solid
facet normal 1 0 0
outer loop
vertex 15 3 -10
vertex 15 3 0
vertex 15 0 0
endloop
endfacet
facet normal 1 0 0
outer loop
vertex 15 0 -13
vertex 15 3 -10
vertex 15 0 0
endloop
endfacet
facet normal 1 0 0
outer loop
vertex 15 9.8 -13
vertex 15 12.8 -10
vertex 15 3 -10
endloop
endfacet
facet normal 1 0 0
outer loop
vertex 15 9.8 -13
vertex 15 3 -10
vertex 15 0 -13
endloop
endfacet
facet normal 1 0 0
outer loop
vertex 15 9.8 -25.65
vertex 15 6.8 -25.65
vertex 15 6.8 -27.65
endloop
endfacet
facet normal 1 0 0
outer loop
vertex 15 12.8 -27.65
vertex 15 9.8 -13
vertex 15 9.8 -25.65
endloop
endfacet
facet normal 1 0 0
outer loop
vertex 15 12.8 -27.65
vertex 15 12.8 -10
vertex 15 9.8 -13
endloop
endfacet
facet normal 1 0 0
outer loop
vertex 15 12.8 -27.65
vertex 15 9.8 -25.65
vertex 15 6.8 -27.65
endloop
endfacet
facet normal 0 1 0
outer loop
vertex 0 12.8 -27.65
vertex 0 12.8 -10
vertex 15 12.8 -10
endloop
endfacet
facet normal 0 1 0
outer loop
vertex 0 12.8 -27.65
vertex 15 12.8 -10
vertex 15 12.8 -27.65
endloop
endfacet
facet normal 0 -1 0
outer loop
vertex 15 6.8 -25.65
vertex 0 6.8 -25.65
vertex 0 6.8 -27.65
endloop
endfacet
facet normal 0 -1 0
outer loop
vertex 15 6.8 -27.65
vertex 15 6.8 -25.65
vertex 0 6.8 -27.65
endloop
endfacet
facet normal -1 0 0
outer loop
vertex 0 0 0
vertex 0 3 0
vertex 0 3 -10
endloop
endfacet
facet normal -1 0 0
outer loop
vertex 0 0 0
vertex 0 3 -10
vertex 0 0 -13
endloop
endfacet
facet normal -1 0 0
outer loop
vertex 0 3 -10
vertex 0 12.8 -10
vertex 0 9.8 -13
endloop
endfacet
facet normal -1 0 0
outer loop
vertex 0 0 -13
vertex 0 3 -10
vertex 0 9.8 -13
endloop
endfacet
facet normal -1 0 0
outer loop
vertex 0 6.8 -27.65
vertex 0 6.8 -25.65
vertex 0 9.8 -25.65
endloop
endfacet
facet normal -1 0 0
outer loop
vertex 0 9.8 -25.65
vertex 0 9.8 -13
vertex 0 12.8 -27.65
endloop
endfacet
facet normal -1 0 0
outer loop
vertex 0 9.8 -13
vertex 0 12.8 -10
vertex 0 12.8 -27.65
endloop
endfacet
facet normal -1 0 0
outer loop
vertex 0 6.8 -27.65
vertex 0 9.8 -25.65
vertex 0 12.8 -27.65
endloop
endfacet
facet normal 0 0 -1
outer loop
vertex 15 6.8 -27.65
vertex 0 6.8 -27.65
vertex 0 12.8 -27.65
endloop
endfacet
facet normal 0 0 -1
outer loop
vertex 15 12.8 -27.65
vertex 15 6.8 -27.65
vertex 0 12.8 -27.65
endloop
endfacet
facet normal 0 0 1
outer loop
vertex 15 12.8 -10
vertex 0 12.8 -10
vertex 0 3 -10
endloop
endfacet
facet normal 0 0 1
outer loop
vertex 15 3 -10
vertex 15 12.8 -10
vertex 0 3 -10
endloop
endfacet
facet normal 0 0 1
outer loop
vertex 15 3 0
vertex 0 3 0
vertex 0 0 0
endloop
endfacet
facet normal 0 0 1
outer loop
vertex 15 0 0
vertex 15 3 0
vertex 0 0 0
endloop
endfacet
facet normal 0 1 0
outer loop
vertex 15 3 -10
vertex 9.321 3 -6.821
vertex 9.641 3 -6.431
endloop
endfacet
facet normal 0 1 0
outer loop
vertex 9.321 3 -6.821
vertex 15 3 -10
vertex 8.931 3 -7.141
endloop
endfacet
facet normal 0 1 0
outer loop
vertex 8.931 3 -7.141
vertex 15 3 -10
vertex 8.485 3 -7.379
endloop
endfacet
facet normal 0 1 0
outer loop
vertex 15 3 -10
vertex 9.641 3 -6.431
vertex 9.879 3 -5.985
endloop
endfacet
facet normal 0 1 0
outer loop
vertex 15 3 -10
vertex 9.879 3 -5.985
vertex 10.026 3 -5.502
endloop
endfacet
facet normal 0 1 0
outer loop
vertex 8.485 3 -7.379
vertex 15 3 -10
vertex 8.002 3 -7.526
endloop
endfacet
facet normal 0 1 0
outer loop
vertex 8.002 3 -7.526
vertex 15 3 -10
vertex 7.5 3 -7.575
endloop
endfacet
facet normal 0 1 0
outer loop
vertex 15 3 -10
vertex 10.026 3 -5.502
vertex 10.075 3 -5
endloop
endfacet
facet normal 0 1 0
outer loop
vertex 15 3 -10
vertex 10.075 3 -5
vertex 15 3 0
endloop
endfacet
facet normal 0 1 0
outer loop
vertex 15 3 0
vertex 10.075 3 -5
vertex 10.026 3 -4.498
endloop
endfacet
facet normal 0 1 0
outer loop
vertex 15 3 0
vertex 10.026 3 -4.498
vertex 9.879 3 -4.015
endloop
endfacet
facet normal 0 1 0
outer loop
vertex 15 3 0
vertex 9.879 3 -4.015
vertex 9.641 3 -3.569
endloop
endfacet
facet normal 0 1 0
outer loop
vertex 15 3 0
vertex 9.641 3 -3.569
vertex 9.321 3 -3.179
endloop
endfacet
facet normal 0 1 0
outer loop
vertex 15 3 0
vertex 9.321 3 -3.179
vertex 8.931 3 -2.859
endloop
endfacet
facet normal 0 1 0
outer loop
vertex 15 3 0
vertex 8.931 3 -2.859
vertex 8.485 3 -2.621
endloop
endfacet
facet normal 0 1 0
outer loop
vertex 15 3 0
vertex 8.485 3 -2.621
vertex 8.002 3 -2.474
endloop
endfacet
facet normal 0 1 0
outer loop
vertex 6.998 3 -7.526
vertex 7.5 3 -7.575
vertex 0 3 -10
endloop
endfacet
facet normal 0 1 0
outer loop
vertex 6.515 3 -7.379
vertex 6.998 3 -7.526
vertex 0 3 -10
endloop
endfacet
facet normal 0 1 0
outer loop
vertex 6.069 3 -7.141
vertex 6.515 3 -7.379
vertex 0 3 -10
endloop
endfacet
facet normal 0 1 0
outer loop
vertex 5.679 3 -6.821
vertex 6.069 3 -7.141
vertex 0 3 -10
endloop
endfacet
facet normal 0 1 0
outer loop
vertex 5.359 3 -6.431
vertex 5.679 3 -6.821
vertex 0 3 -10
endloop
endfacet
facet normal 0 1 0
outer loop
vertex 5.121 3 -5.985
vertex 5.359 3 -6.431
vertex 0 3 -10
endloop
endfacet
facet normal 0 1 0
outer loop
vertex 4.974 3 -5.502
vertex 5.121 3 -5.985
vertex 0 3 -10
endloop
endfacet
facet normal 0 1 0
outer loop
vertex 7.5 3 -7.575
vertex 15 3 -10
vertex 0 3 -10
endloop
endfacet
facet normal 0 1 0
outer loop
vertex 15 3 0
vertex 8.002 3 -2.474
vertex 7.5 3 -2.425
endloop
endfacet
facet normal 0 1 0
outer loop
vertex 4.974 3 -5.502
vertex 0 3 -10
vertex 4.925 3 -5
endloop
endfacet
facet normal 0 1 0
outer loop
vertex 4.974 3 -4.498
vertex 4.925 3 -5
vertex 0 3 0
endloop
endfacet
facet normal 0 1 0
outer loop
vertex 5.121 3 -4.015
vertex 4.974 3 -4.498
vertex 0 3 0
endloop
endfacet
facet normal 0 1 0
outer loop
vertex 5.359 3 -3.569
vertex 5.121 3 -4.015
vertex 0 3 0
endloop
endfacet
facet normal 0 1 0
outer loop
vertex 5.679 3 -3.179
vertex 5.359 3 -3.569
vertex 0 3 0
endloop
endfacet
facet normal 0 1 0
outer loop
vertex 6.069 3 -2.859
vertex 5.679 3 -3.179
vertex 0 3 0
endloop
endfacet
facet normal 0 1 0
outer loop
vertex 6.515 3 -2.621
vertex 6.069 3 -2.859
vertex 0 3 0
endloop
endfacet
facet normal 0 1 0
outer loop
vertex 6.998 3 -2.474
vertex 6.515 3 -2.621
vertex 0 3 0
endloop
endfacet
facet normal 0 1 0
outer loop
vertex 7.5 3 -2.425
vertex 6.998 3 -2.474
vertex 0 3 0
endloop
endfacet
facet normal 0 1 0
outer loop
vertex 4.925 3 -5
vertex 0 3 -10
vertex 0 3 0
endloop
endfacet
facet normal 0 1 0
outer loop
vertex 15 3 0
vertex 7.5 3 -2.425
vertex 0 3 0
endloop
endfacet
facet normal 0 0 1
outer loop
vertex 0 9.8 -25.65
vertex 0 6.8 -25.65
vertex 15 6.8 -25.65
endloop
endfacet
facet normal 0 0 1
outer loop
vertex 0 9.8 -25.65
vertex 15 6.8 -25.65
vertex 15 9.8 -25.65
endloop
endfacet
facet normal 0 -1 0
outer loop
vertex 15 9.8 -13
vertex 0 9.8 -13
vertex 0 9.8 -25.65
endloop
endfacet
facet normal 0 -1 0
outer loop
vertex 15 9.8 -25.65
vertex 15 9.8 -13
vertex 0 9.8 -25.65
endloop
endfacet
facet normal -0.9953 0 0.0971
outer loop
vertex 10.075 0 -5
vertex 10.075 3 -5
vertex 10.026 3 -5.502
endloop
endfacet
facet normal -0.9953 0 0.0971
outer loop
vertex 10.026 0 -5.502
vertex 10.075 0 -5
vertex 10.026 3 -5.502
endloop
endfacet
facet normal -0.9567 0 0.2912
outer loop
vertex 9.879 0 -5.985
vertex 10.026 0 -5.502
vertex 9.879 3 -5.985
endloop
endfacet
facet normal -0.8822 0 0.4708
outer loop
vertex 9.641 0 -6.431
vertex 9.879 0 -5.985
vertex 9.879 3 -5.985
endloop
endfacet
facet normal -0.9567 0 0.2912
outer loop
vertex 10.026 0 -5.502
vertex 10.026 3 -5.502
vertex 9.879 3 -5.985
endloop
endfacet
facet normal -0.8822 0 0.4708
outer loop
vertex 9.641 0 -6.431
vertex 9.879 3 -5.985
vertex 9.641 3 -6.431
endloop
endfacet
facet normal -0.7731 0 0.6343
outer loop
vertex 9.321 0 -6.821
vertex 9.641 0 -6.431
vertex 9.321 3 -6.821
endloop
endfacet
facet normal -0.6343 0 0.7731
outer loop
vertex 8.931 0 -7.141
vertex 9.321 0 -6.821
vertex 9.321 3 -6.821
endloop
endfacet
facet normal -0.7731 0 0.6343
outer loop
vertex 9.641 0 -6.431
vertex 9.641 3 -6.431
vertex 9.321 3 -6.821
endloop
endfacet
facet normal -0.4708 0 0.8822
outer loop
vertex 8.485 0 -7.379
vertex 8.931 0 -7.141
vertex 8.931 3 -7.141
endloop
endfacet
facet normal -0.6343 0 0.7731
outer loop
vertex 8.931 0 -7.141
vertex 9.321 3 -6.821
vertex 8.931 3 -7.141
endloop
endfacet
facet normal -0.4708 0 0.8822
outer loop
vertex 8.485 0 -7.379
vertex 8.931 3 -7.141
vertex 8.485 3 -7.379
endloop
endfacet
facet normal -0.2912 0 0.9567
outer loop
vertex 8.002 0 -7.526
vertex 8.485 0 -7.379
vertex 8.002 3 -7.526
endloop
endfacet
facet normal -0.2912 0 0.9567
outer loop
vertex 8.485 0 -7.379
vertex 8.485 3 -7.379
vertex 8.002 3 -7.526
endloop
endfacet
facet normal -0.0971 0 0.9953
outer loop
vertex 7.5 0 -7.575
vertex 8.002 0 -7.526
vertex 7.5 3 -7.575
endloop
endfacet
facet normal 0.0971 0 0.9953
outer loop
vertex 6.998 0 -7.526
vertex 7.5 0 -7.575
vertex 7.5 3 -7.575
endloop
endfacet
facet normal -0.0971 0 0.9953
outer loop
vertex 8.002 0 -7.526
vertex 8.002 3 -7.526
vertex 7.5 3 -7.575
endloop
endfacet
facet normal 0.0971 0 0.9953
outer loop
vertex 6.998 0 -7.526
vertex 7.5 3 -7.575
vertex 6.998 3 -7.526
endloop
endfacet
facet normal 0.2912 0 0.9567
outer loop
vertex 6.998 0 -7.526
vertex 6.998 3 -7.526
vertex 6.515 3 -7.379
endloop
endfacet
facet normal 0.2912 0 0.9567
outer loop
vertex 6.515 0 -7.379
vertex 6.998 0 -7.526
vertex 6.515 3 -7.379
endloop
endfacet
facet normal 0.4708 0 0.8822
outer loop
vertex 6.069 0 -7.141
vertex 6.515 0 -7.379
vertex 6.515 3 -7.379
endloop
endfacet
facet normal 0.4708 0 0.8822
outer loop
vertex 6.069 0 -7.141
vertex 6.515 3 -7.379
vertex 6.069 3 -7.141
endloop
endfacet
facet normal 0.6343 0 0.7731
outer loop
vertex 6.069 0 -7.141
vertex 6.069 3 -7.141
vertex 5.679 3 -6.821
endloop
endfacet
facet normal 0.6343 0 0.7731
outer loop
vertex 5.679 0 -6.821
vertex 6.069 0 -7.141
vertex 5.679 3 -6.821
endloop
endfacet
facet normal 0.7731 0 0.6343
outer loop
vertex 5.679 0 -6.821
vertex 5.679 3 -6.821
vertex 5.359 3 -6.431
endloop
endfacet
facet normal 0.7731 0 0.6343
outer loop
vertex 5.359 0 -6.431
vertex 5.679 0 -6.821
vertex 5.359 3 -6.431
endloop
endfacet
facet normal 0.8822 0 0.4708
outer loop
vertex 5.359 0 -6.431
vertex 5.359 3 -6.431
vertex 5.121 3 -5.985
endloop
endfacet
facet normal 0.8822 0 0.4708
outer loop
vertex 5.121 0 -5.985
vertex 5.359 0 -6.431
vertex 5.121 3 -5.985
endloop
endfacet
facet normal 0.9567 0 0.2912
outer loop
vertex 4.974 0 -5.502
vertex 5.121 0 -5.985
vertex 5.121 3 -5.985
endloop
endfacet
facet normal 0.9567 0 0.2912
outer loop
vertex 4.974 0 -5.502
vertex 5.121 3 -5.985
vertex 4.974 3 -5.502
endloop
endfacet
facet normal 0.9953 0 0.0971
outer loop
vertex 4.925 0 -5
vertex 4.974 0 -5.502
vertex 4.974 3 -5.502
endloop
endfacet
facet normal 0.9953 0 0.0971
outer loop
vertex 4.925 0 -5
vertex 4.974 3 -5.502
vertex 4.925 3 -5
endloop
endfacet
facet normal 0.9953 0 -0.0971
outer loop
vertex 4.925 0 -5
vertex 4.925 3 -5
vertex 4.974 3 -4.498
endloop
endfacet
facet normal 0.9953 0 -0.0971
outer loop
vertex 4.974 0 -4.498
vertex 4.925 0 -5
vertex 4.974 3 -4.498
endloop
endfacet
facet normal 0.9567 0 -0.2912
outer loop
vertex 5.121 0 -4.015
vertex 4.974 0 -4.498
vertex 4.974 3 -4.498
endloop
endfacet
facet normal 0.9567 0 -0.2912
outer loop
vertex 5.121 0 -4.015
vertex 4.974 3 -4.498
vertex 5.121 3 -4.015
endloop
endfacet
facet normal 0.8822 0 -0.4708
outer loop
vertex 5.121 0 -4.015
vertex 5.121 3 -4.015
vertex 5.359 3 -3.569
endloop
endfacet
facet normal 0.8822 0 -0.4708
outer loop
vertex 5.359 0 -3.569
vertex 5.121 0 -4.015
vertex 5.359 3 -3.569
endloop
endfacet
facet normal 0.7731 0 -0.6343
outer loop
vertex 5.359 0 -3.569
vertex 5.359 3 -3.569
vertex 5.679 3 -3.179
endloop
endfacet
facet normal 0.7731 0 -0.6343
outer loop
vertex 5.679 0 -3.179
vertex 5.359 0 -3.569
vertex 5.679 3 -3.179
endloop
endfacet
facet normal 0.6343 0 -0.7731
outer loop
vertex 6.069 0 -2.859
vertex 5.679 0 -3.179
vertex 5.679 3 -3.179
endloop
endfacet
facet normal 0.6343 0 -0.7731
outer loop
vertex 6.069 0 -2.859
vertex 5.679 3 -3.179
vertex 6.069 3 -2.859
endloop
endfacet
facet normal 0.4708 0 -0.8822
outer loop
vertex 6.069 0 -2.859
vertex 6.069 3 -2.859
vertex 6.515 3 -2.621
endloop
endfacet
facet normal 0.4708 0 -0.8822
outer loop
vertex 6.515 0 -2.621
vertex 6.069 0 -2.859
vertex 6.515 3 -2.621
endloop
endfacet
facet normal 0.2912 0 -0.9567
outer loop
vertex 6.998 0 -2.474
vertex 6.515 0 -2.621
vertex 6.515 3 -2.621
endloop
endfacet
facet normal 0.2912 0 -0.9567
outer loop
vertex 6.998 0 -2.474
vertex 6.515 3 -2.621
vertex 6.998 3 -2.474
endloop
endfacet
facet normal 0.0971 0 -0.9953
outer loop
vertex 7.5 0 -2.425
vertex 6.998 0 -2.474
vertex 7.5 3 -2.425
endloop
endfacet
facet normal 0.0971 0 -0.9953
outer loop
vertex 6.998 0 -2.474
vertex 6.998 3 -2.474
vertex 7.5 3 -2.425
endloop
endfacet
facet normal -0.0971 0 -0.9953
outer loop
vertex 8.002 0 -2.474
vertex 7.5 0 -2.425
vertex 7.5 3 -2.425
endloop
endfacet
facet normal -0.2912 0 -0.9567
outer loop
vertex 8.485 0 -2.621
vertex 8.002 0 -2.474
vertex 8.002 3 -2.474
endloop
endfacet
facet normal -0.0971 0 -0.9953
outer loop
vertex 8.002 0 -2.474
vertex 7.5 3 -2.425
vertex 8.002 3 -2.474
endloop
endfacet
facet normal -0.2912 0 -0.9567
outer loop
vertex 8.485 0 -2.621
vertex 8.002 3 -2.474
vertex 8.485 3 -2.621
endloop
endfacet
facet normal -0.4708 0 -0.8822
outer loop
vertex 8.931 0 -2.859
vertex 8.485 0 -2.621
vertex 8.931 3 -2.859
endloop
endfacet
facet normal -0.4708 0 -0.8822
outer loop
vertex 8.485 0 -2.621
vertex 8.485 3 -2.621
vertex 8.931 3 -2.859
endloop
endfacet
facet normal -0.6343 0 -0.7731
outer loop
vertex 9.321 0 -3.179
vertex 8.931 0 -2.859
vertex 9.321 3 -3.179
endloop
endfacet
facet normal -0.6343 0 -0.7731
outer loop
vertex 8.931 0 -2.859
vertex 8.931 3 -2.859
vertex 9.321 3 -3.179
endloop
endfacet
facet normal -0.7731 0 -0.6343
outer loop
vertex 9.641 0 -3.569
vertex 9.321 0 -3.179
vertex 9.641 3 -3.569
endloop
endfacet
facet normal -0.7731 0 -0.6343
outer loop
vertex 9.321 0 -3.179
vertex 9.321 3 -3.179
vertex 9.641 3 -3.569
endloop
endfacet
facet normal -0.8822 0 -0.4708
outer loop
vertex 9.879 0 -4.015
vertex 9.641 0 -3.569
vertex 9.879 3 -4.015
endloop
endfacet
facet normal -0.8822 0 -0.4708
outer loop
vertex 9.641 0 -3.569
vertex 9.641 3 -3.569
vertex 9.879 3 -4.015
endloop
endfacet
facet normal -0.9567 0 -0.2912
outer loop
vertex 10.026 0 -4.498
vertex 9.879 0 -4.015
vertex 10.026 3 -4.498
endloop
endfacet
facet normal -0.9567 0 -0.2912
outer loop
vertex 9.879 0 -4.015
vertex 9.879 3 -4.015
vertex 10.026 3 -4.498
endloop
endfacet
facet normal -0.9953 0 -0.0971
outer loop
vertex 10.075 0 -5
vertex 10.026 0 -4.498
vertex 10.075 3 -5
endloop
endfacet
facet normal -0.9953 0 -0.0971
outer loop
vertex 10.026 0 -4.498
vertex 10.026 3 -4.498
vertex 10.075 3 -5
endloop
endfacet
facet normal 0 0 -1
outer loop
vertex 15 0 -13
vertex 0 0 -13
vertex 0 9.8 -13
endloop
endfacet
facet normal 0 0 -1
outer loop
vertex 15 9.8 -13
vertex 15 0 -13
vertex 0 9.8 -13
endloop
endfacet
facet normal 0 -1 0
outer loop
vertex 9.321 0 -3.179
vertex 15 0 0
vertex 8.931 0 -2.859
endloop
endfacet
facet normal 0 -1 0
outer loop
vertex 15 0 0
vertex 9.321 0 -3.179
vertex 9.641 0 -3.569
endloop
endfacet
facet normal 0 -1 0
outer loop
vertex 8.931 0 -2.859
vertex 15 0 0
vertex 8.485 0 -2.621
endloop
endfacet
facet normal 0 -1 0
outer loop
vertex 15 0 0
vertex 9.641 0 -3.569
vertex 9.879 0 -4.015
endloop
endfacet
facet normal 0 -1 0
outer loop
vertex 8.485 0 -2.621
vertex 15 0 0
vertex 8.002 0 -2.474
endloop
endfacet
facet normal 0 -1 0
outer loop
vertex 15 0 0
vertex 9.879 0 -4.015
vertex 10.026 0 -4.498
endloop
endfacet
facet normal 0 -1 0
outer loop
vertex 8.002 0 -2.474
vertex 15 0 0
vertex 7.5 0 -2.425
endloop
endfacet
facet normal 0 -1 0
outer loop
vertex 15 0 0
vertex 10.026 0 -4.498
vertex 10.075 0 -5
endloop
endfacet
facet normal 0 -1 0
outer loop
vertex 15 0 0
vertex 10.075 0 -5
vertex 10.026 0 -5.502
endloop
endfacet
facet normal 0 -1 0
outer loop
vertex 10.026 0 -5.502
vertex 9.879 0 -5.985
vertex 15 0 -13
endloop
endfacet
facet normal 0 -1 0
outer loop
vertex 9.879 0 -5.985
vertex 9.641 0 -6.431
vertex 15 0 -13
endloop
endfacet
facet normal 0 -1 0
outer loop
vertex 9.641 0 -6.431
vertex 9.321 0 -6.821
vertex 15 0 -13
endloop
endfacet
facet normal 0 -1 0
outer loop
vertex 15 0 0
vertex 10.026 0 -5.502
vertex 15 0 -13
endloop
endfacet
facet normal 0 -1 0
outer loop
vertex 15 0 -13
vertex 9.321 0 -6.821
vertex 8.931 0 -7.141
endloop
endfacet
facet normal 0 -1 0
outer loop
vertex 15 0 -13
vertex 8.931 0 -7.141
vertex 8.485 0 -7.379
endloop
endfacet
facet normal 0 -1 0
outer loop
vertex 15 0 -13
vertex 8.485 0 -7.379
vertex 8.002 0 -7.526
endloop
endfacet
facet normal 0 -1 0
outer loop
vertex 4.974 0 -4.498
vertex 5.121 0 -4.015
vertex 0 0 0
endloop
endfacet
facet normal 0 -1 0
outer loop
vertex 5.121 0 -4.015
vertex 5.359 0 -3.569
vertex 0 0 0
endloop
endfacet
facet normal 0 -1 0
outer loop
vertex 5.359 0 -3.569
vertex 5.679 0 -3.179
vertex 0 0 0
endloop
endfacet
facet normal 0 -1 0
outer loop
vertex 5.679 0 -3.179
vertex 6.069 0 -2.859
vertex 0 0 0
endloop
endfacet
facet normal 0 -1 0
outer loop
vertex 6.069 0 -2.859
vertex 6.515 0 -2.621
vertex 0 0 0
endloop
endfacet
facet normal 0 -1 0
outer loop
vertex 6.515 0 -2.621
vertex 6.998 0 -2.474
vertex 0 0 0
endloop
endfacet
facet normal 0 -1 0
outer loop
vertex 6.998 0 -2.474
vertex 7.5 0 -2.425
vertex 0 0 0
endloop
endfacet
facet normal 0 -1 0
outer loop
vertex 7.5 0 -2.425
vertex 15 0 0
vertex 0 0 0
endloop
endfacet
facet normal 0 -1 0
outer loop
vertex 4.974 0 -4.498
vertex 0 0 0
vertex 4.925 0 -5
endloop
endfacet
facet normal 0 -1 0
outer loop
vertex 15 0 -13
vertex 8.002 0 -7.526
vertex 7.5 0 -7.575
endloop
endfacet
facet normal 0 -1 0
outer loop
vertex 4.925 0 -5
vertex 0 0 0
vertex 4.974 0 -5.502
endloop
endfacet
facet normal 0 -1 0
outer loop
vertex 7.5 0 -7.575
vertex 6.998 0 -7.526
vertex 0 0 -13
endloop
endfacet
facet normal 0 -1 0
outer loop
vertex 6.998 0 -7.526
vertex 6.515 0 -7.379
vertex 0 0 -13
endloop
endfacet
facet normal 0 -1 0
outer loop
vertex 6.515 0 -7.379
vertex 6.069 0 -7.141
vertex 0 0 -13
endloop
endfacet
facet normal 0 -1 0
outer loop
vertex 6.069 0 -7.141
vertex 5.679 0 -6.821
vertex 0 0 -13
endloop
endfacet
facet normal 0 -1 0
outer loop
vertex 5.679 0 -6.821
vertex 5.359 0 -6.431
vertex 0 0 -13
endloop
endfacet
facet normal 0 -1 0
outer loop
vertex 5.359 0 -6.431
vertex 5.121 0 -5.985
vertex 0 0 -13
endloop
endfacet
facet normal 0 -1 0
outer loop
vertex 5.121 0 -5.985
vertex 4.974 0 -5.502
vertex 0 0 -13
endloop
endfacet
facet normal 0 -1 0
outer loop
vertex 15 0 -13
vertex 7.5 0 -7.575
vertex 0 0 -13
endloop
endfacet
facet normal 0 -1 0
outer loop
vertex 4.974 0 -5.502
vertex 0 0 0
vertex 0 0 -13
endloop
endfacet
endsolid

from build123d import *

# Parameters (mm, degrees)
SALIENTE_EXTRUIR1_DEPTH = 15
CROQUIS4_W              = 2
CROQUIS4_H              = 6
SALIENTE_EXTRUIR2_DEPTH = 15
CROQUIS5_R              = 2.575
CORTAR_EXTRUIR1_DEPTH   = 4


with BuildPart() as part:
    # Croquis2 → Saliente-Extruir1 (new body)
    with BuildSketch(Plane(origin=(0, 0, 0), x_dir=(0, 0, -1), z_dir=(1, 0, 0))):
        Polygon((0, 0), (13, 0), (13, 9.8), (25.65, 9.8), (25.65, 12.8), (10, 12.8), (10, 3), (0, 3), align=None)
    extrude(amount=SALIENTE_EXTRUIR1_DEPTH)

    # Croquis4 → Saliente-Extruir2 (add, through all)
    with BuildSketch(Plane(origin=(0, 0, 0), x_dir=(0, 0, -1), z_dir=(1, 0, 0))):
        with Locations((26.65, 9.8)):
            Rectangle(CROQUIS4_W, CROQUIS4_H)
    extrude(amount=SALIENTE_EXTRUIR2_DEPTH)

    # Croquis5 → Cortar-Extruir1 (cut, through all)
    with BuildSketch(Plane(origin=(0, 3, 0), x_dir=(1, 0, 0), z_dir=(0, 1, 0))):
        with Locations((7.5, 5)):
            Circle(CROQUIS5_R)
    extrude(amount=-CORTAR_EXTRUIR1_DEPTH, mode=Mode.SUBTRACT)


solid = part.part
